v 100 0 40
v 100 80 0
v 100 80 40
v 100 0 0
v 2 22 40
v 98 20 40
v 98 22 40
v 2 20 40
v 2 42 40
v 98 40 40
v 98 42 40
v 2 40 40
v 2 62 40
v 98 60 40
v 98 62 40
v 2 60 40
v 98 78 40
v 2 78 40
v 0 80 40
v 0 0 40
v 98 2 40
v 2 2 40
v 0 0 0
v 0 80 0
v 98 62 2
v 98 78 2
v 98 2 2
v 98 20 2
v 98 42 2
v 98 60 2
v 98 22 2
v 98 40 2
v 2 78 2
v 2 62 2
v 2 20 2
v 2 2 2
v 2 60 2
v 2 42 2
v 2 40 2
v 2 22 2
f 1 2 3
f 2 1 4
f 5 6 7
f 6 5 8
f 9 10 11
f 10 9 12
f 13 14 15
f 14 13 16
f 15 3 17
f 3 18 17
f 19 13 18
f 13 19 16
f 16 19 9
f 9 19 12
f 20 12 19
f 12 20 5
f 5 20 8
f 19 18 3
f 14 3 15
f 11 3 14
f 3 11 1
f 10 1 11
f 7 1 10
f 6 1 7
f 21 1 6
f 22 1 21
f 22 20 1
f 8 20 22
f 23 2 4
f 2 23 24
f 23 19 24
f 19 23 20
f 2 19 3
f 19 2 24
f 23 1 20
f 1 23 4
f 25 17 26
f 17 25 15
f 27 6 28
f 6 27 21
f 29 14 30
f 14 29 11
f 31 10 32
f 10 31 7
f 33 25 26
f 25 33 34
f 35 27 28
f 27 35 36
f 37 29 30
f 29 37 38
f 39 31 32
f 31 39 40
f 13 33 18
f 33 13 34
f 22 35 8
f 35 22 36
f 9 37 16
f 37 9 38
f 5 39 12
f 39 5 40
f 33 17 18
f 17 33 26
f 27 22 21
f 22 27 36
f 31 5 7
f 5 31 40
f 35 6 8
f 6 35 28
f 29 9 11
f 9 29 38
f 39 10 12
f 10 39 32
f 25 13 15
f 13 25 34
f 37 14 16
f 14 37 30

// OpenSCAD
difference() {

    cube([100,80,40]);

    translate([2,2,2])
        cube([96,76,38]);

}

translate([0,20,0])
cube([100,2,40]); 

translate([0,40,0])
cube([100,2,40]); 

translate([0,60,0])
cube([100,2,40]); 
